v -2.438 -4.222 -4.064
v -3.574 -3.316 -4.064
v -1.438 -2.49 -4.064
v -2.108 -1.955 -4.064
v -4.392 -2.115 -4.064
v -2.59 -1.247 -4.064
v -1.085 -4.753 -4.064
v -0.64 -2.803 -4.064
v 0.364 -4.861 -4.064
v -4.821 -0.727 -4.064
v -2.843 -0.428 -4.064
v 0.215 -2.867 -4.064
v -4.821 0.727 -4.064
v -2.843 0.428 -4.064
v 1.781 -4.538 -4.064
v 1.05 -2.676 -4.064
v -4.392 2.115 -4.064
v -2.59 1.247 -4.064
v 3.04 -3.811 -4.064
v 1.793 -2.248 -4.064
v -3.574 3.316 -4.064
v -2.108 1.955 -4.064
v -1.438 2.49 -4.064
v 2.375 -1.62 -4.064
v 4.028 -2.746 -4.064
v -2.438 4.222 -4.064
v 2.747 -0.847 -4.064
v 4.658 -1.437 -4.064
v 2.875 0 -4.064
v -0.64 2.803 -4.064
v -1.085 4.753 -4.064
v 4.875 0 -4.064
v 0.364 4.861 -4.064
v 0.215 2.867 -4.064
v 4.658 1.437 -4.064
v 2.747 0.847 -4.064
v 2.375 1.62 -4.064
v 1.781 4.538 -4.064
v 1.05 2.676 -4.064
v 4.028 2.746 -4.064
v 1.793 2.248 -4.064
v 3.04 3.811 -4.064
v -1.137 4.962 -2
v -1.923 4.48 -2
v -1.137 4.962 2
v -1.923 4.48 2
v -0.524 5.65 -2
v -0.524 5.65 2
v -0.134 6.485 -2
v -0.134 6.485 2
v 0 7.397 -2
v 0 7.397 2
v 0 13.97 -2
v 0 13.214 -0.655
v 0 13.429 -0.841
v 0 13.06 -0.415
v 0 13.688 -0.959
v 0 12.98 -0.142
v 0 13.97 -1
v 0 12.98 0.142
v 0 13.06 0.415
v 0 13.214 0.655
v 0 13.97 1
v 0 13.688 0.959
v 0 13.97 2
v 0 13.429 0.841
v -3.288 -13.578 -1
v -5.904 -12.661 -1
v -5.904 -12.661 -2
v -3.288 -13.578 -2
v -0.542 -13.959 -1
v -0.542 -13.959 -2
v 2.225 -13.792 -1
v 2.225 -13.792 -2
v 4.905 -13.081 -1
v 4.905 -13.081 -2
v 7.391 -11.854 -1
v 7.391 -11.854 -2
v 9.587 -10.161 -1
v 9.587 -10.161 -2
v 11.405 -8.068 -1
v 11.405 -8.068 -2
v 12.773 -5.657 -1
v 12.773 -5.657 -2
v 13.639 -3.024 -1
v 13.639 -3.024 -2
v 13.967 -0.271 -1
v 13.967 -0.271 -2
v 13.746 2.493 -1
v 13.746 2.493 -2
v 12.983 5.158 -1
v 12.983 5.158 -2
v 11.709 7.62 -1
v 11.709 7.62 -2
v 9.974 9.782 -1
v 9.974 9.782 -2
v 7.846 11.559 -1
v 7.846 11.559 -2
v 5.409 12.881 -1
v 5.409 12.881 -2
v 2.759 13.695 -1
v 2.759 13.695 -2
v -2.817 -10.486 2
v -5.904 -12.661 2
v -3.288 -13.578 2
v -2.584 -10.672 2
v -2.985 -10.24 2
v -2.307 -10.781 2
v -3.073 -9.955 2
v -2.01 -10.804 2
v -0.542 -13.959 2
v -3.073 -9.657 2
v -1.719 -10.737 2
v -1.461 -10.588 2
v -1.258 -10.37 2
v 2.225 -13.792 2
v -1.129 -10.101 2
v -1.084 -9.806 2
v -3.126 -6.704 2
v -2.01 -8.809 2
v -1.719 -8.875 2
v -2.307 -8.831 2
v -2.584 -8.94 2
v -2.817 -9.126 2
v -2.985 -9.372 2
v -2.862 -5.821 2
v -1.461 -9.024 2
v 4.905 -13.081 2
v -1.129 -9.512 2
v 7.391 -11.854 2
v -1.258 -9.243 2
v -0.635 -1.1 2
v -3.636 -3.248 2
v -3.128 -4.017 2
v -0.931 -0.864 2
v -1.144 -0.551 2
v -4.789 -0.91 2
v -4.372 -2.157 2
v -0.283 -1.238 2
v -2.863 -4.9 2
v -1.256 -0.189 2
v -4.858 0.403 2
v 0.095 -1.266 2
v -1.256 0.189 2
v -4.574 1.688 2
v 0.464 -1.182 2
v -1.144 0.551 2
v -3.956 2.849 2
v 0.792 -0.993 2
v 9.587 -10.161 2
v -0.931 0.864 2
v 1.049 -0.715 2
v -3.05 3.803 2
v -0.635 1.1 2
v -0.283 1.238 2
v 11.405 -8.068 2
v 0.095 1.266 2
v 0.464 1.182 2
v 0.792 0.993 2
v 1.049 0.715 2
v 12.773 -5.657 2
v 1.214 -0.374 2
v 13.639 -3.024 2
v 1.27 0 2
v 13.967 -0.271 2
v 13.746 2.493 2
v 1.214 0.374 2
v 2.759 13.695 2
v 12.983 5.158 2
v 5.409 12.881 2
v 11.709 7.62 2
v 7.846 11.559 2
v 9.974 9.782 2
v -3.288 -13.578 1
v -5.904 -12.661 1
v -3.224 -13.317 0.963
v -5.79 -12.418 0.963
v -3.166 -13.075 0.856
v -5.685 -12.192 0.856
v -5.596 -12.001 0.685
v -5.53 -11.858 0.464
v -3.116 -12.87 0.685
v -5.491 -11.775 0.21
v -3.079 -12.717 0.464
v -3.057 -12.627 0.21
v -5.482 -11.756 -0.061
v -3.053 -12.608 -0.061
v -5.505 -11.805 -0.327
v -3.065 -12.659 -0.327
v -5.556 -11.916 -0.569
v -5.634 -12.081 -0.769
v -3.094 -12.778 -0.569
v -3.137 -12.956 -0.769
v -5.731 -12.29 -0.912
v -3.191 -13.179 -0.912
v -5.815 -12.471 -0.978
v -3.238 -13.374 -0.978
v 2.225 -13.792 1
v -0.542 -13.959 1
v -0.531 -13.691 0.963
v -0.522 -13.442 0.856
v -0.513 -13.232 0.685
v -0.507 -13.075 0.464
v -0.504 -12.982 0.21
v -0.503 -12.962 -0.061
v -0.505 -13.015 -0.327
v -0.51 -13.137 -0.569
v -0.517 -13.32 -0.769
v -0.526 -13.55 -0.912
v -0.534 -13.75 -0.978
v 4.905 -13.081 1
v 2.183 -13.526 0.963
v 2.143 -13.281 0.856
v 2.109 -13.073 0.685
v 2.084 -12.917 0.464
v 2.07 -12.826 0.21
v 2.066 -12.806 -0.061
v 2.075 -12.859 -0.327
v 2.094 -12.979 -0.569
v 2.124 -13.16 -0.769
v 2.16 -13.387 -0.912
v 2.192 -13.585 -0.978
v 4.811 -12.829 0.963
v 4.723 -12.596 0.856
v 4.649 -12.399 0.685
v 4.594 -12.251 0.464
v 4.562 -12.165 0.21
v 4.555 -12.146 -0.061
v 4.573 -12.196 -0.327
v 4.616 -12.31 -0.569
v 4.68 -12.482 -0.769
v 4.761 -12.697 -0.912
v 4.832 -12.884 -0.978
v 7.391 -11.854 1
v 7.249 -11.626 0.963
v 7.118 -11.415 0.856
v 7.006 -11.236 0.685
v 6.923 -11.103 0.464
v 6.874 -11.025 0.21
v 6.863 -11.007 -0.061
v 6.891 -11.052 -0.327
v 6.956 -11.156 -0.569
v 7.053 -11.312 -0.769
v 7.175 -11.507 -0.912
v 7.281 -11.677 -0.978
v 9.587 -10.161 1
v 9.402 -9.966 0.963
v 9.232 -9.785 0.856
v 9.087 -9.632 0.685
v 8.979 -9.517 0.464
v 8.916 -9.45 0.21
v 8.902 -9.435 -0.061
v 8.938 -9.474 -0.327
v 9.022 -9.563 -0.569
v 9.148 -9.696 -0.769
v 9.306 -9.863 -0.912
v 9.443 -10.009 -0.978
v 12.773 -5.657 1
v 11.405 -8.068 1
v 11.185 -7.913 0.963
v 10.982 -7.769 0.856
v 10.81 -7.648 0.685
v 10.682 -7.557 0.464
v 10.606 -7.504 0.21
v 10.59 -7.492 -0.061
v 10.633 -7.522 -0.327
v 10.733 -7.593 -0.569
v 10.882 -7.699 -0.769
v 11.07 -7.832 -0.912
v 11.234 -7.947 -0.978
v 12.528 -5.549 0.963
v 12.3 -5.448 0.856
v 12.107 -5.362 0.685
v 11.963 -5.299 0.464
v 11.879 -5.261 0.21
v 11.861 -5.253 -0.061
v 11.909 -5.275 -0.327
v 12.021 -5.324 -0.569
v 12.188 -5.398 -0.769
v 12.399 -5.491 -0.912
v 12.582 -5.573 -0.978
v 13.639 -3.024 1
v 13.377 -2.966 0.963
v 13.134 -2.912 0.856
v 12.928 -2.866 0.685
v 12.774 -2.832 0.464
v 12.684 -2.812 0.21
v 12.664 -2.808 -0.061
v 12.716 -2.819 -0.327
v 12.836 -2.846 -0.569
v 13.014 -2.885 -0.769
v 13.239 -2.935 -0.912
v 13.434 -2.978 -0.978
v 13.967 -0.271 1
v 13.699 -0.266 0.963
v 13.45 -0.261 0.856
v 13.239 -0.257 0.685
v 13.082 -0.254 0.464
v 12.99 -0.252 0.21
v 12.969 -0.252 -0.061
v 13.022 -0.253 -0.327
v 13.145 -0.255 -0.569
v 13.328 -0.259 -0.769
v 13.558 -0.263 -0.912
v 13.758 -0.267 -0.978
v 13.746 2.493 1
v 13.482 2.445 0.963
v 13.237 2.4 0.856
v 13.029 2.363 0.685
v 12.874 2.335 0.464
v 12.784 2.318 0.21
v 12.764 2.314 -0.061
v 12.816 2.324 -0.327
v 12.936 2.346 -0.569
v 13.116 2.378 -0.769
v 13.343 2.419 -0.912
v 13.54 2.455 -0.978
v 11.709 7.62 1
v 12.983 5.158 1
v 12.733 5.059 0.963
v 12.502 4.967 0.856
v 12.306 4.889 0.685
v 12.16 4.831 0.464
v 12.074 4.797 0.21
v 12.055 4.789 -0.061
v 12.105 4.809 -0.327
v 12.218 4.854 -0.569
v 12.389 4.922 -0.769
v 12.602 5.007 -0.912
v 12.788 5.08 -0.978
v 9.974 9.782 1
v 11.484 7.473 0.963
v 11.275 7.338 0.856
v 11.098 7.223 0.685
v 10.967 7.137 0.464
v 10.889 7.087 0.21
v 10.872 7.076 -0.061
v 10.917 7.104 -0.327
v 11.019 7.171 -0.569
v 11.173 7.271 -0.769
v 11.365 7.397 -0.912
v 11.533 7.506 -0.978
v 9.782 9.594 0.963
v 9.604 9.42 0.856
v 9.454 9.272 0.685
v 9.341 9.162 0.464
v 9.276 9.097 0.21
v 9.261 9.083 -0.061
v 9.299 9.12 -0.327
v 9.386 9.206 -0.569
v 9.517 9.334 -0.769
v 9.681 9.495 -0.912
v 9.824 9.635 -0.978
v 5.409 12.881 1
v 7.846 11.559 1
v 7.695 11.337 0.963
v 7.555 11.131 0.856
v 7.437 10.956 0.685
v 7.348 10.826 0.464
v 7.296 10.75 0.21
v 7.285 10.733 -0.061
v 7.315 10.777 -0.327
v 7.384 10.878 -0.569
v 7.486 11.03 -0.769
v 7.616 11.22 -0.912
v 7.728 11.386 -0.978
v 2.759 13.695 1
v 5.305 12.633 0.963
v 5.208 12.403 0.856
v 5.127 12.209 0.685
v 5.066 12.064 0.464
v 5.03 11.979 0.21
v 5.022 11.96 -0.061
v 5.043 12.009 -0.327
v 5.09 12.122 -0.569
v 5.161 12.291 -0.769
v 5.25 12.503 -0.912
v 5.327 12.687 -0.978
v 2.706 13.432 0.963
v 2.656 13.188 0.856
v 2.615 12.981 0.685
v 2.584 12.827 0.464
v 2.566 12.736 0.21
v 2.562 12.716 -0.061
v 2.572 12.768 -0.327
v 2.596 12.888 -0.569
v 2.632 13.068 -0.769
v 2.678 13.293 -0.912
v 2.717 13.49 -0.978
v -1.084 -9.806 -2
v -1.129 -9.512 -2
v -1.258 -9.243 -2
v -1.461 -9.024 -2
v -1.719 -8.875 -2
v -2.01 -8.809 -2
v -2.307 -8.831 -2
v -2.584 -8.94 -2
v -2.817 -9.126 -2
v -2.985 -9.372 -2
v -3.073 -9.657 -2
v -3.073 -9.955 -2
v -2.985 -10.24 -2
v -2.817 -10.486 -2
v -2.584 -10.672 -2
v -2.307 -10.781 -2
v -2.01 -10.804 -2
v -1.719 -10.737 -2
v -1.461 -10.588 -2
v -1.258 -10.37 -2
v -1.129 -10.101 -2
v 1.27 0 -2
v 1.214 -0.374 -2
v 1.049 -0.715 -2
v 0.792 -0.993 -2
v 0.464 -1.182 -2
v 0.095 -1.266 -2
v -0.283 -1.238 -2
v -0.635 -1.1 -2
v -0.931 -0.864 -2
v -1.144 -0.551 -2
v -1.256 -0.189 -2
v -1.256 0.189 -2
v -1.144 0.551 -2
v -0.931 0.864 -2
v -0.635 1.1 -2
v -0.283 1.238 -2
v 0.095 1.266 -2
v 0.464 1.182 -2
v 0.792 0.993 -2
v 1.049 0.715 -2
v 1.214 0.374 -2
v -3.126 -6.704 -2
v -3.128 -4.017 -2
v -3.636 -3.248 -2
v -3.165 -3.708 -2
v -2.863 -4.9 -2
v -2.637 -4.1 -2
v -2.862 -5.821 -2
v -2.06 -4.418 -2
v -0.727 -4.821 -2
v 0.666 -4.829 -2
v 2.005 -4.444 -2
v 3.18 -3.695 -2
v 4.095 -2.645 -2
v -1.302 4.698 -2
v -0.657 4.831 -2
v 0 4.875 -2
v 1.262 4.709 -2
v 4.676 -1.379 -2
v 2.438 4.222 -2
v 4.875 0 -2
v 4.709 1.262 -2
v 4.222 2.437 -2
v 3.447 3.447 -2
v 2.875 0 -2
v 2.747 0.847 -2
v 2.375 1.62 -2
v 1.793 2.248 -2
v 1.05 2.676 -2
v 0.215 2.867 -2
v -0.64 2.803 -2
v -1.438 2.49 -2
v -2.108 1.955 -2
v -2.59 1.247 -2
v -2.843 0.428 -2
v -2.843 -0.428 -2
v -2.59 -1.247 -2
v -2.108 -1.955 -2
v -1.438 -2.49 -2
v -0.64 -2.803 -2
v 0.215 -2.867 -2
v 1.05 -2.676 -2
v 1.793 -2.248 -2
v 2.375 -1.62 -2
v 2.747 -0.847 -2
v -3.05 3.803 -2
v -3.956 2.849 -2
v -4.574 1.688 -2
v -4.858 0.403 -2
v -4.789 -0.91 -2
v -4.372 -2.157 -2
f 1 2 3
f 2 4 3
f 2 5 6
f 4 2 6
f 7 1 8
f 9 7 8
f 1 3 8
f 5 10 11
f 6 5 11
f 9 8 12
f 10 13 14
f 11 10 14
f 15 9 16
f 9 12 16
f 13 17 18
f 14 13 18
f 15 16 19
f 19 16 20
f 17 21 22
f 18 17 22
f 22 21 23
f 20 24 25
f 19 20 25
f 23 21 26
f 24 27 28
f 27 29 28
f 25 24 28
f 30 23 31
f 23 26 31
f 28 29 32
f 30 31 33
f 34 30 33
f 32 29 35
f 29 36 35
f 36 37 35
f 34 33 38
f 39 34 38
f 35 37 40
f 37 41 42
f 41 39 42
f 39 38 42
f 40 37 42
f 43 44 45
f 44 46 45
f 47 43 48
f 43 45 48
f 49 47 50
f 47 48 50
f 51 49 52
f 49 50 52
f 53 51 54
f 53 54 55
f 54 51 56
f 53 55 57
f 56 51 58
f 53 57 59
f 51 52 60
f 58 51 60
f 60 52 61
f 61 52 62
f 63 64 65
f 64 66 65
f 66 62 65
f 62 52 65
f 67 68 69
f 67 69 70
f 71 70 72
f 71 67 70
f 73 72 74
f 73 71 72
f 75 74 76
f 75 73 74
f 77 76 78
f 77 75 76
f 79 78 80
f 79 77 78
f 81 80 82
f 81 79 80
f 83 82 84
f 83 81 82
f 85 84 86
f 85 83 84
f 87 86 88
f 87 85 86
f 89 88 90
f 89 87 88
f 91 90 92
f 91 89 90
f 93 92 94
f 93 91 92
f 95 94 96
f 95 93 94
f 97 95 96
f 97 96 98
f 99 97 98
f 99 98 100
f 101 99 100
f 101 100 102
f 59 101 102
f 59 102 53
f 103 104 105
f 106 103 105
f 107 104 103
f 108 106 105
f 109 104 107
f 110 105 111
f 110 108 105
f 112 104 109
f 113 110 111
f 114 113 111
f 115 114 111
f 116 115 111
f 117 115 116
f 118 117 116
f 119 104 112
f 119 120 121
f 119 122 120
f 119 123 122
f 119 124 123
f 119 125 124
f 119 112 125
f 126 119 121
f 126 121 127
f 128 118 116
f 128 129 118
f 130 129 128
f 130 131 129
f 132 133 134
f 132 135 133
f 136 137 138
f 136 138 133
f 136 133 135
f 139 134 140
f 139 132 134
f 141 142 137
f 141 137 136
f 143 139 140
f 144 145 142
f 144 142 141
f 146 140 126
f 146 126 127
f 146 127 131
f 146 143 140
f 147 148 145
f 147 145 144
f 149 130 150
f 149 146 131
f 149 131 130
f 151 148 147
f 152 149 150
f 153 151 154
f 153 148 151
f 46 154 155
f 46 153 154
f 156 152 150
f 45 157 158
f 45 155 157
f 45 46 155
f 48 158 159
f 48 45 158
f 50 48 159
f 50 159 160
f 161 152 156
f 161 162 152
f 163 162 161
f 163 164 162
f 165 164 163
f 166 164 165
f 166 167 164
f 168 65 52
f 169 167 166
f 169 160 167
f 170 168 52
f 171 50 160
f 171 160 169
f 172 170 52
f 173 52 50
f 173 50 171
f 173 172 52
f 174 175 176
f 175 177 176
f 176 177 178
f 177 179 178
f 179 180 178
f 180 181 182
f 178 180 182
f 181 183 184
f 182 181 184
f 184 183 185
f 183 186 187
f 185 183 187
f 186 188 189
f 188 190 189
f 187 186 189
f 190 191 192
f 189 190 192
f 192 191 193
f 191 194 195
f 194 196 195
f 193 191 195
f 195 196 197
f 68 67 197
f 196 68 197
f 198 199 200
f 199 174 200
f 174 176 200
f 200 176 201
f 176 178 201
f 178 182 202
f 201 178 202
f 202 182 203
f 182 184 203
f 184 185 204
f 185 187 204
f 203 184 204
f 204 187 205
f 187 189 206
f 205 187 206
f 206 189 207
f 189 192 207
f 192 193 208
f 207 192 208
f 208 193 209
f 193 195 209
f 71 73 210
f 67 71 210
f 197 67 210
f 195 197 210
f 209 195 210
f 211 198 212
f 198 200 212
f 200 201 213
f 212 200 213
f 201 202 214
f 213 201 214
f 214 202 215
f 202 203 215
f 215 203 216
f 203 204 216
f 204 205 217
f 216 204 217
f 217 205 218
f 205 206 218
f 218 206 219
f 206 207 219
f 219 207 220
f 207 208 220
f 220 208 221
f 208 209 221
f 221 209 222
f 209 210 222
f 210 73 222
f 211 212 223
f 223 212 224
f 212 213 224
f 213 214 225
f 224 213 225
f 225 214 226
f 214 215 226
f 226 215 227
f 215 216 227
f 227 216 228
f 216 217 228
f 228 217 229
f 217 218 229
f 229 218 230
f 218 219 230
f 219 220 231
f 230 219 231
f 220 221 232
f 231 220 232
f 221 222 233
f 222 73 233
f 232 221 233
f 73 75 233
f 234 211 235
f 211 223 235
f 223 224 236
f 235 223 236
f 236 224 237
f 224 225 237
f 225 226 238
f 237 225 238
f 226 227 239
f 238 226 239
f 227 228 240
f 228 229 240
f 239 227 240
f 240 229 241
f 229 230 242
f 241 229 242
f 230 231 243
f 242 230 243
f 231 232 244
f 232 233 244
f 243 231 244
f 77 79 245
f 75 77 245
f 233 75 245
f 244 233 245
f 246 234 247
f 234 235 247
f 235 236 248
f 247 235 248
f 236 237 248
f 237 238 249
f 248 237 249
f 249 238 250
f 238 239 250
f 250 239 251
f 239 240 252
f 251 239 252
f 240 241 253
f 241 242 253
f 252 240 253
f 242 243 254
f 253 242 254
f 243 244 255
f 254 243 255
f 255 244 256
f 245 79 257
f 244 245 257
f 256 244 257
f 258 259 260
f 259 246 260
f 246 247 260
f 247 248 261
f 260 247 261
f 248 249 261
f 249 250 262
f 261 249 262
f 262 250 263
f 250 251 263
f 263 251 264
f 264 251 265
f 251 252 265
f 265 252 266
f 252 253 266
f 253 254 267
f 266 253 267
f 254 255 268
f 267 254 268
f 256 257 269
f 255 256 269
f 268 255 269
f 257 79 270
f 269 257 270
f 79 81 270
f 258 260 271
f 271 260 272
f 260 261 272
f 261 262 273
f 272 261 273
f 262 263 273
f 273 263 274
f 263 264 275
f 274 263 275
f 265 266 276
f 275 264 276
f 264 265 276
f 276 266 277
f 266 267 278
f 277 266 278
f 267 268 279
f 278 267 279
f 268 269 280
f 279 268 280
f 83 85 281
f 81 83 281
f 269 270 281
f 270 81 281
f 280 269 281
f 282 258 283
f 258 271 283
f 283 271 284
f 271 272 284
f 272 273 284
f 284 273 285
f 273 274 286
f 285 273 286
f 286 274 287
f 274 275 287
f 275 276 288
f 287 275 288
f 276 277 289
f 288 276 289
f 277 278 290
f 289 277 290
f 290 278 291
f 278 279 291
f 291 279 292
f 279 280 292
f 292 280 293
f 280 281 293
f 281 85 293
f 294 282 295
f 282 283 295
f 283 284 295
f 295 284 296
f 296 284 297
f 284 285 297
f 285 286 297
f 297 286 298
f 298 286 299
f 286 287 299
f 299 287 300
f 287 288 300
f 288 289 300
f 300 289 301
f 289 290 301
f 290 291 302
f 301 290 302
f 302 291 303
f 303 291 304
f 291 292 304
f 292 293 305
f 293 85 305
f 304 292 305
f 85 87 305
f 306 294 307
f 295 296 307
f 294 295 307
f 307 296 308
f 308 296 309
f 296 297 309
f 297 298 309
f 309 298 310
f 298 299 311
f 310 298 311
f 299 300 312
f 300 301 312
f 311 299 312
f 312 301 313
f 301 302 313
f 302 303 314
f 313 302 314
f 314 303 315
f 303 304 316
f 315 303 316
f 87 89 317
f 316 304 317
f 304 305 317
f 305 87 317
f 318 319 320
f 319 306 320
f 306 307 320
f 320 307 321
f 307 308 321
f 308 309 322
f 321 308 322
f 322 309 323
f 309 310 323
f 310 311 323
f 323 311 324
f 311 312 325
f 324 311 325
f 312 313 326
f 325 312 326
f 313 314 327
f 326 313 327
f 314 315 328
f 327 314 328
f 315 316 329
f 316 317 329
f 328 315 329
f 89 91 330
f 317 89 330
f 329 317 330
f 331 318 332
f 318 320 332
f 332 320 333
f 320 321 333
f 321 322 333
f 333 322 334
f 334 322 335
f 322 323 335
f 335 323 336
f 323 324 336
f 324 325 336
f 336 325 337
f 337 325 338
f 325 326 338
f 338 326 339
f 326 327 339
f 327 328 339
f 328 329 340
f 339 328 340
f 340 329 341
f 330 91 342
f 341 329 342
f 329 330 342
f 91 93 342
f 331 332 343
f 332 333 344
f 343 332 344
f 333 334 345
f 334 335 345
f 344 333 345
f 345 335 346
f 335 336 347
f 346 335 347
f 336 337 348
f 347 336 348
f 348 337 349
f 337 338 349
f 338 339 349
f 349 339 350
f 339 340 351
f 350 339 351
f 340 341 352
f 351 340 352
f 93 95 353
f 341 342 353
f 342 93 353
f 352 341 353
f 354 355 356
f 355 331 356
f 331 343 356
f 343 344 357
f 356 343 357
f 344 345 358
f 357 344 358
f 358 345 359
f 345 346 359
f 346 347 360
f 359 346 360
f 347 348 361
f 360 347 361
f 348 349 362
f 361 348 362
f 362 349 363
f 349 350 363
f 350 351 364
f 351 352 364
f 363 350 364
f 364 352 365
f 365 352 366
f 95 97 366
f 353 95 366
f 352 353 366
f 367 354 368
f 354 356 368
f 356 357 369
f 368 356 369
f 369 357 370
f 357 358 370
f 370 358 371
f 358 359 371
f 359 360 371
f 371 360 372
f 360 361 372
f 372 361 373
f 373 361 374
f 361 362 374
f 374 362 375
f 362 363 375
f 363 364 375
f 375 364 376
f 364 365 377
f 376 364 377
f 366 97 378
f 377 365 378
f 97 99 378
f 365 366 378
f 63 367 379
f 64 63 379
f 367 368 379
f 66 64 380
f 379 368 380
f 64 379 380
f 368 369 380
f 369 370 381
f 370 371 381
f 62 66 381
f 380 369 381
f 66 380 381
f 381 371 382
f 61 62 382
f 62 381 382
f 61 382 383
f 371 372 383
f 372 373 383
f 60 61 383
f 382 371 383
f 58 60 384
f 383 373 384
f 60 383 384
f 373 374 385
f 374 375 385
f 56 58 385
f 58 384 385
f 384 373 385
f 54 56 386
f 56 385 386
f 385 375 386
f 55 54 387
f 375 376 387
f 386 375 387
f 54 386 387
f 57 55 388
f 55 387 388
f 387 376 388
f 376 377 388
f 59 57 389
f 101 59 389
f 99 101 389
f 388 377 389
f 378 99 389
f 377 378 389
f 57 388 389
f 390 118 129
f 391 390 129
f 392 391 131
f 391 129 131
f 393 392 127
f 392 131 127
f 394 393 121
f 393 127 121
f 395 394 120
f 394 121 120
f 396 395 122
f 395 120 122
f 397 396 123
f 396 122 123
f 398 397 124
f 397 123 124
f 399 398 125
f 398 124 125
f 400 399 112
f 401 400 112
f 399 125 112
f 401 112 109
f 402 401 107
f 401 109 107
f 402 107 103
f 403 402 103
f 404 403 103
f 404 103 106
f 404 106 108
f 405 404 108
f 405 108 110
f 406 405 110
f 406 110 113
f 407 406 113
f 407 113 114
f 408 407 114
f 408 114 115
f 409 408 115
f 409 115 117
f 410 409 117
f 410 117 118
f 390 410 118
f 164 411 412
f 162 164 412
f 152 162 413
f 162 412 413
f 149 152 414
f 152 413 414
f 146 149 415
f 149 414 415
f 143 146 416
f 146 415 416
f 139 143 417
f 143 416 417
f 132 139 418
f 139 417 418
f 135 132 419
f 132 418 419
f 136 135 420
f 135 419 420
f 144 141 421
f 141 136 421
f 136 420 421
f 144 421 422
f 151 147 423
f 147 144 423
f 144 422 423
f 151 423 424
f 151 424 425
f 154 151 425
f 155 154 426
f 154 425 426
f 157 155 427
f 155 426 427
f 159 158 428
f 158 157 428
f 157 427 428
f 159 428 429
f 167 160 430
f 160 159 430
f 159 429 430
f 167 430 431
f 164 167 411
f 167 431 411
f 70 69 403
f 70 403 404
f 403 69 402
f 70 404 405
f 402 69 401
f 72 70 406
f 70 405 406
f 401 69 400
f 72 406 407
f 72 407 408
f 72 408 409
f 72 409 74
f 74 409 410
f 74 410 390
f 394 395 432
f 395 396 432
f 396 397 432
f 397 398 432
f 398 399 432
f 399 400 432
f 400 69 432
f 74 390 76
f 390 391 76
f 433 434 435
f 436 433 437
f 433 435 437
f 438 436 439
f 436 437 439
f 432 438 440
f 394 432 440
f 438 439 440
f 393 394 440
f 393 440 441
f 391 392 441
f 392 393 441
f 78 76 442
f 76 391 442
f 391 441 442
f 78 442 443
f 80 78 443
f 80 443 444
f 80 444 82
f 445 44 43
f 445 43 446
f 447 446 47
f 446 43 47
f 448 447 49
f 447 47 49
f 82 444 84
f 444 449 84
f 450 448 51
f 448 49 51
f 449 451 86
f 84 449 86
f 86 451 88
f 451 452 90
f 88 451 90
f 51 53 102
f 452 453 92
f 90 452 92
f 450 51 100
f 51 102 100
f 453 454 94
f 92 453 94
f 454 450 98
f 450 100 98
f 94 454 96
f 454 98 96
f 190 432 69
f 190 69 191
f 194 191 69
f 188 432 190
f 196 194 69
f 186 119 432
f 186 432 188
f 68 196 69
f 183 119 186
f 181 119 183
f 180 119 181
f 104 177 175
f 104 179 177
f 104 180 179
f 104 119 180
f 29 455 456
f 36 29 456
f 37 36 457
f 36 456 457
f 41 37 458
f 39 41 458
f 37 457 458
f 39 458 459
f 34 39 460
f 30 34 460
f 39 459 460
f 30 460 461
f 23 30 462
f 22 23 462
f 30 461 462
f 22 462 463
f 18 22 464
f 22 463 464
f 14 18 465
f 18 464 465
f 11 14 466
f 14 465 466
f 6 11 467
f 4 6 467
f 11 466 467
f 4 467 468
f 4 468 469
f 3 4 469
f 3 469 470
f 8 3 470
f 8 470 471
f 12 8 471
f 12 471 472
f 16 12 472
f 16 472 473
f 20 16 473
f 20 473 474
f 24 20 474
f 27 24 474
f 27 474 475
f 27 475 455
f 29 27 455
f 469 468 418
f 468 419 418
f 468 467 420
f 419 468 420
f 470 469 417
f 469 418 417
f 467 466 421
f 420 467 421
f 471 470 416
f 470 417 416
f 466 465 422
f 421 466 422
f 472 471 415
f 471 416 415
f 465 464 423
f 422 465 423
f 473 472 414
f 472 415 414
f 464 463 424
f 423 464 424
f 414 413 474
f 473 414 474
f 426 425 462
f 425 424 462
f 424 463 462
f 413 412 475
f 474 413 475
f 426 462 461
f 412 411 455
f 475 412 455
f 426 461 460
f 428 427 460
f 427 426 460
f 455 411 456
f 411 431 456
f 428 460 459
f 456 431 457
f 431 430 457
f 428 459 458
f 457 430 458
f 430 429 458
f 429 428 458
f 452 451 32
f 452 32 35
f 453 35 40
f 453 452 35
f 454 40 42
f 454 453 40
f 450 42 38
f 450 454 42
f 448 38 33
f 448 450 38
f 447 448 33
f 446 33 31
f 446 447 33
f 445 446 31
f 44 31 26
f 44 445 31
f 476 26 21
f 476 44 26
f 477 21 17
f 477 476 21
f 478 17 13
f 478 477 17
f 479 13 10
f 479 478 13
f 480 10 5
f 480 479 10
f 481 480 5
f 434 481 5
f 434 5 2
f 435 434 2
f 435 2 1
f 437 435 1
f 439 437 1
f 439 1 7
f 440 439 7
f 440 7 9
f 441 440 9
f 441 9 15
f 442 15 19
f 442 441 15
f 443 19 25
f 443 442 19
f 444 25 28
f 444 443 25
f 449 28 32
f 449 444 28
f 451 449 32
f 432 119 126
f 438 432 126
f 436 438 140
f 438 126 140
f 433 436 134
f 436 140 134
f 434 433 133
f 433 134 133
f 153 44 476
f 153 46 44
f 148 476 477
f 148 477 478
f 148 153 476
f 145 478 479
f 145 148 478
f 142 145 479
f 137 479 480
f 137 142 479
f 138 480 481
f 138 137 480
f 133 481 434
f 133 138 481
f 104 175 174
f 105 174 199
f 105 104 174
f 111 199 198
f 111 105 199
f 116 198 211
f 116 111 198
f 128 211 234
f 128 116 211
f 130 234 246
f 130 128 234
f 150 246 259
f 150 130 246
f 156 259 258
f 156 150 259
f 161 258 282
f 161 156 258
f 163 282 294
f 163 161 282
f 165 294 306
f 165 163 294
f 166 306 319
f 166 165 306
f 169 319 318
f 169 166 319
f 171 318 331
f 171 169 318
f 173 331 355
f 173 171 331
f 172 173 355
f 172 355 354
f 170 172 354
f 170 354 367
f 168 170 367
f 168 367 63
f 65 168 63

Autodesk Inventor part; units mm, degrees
ref_plane "YZ Plane" through (0, 0, 0) normal (1, 0, 0) x (0, 1, 0)
ref_plane "XZ Plane" through (0, 0, 0) normal (0, 1, 0) x (-1, 0, 0)
ref_plane "XY Plane" through (0, 0, 0) normal (0, 0, 1) x (1, 0, 0)
sketch "Sketch1" plane through (0, 0, 0) normal (0, 0, 1) x (1, 0, 0)
  circle A0 centre (0, 0) radius 2.875
  circle A1 centre (0, 0) radius 4.875
  circle A2 centre (0, 0) radius 13.97
  dimension "d0" = 5.75
  dimension "d2" = 2
  dimension "d3" = 27.94
extrude "Extrusion1" add sketch "Sketch1" against normal blind 4.064 contours A1
sketch "Sketch2" plane through (0, 0, 0) normal (0, 0, 1) x (1, 0, 0)
  circle A0 centre (0, 0) radius 4.875 projected
  circle A1 centre (0, 0) radius 1.27
  circle A2 centre (0, 0) radius 13.97
  dimension "d6" = 2.54
  dimension "d7" = 27.94
extrude "Extrusion2" add sketch "Sketch2" along normal mid plane 4 contours A0 | A2
sketch "Sketch3" plane through (0, 0, 0) normal (1, 0, 0) x (0, 1, 0)
  line L0 (13.97, 2) -> (-13.97, 2) projected
  line L1 (-13.97, -2) -> (13.97, -2) projected
  line L2 (13.97, 2) -> (13.97, -2)
  circle A0 centre (13.97, 0) radius 1
  line L3 (0, 2) -> (0, -2) construction
  point P0 (0, 0)
  dimension "d10" = 2
revolve "Revolution1" cut sketch "Sketch3" angle 360 about axis through (0, 0, 2) along (0, 0, -1)
sketch "Sketch4" plane through (0, 0, 2) normal (0, 0, 1) x (1, 0, 0)
  circle A0 centre (0, 0) radius 13.97 projected
  line L0 (0, 4.875) -> (0, 13.97)
  line L1 (0, 0) -> (9.9312, 0) construction
  circle A1 centre (-2.0844, -9.8063) radius 1
  arc A2 (0, 4.875) -> (-2.0603, -4.4183) centre (0, 0) ccw
  line L2 (-2.0603, -4.4183) -> (-5.904, -12.6611)
  dimension "d13" = 2
extrude "Extrusion3" cut sketch "Sketch4" against normal blind 4 contours L0 A2 L2 A0 | A1 picked at (-8.1024, 7.2275)
fillet "Fillet1" radius 3.175 2 edges at (0, 4.875, 0) (-2.0603, -4.4183, 0)
properties part number "Pulley"
